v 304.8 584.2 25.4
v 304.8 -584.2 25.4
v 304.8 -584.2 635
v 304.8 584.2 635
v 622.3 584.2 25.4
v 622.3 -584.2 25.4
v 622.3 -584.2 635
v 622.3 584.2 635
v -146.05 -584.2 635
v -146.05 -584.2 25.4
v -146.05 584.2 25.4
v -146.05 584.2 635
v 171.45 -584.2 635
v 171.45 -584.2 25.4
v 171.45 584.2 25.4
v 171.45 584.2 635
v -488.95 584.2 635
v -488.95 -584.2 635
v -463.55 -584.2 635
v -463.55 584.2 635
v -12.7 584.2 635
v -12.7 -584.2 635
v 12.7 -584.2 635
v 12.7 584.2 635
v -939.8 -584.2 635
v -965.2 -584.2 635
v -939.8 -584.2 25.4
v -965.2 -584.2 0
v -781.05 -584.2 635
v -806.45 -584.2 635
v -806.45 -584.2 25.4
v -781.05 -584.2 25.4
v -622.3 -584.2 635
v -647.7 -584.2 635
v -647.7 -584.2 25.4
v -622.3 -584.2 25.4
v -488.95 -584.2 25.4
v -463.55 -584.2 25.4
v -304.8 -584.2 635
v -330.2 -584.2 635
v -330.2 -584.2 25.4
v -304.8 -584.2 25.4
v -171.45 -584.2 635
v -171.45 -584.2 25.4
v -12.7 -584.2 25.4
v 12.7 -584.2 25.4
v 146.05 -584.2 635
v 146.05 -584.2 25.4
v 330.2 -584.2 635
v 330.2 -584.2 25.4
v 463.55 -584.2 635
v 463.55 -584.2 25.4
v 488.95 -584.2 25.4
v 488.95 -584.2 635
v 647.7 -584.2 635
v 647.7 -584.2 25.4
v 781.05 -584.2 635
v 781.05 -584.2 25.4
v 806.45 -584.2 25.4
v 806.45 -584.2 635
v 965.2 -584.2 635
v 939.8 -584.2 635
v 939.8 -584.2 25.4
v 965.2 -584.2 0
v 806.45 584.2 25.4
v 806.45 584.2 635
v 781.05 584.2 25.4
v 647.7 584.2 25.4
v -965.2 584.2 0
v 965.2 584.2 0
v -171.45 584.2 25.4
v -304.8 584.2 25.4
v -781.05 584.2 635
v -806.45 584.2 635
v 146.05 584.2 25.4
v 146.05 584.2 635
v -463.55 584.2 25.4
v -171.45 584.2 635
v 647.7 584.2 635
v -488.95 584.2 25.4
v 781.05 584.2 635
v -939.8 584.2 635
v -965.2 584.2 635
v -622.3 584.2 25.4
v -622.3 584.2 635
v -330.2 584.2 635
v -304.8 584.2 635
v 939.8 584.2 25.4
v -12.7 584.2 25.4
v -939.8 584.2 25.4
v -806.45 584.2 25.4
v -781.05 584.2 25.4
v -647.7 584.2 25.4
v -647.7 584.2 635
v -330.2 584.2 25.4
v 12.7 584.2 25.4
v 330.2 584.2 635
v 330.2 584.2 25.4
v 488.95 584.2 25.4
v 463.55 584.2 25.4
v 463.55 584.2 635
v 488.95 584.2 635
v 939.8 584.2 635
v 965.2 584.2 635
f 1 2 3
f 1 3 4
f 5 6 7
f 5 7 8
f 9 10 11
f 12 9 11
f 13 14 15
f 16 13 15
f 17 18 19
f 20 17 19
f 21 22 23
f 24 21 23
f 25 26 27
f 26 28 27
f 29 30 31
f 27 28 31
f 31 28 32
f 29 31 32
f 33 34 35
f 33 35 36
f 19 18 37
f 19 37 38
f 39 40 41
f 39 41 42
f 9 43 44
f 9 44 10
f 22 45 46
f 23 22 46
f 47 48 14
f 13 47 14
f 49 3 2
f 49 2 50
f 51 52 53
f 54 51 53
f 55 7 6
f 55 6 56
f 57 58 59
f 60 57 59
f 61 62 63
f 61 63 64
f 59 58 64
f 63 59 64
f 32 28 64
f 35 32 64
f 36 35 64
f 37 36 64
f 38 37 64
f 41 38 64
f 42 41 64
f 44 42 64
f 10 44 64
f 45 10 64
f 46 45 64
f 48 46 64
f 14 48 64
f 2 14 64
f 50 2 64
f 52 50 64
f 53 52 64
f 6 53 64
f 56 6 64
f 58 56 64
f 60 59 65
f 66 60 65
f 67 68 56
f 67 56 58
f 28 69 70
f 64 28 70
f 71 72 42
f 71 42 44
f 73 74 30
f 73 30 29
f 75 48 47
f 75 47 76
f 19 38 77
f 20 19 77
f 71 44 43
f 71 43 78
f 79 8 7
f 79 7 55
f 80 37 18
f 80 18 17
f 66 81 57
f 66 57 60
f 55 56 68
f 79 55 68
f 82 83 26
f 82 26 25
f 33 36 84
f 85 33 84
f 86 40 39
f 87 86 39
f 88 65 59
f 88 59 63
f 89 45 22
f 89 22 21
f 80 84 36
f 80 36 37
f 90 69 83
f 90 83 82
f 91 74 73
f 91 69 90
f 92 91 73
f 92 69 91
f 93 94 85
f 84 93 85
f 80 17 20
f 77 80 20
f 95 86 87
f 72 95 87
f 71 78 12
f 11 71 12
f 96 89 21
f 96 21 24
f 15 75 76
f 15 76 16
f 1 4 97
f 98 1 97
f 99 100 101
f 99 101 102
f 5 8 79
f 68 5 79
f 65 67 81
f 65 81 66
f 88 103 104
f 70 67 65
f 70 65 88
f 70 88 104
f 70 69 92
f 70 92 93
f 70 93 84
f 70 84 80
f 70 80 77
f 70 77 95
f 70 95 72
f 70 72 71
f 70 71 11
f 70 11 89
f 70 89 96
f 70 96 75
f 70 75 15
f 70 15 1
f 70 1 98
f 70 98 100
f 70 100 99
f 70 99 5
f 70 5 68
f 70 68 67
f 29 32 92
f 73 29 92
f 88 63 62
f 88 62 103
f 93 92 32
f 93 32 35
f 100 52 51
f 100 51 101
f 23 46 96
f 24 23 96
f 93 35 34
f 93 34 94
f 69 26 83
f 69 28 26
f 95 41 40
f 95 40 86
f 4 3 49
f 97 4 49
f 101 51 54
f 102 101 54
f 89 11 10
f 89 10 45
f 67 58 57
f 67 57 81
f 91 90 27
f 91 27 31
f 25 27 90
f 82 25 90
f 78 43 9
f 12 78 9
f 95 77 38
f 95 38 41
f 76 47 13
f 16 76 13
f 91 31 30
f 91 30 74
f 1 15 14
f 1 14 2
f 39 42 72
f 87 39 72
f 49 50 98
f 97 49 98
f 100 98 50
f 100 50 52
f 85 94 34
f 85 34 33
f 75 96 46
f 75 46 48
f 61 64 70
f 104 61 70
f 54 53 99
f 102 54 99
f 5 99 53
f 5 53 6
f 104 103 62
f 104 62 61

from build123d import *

# Parameters (mm, degrees)
F0_W     = 1930.4
F0_H     = 1168.4
F1_DEPTH = 25.4
F2_W     = 25.4
F2_H     = 1168.4
F3_DEPTH = 609.6


with BuildPart() as f1:
    # F0 (on Top) → F1 (new body)
    with BuildSketch(Plane.XY):
        Rectangle(F0_W, F0_H)
    extrude(amount=F1_DEPTH)

    # F2 (on face) → F3 (join)
    with BuildSketch(Plane.XY.offset(25.4)):
        with Locations((-952.5, 0)):
            Rectangle(F2_W, F2_H)
        with Locations((-793.75, 0)):
            Rectangle(F2_W, F2_H)
        with Locations((-635, 0)):
            Rectangle(F2_W, F2_H)
        with Locations((-476.25, 0)):
            Rectangle(F2_W, F2_H)
        with Locations((-317.5, 0)):
            Rectangle(F2_W, F2_H)
        with Locations((-158.75, 0)):
            Rectangle(F2_W, F2_H)
        Rectangle(F2_W, F2_H)
        with Locations((158.75, 0)):
            Rectangle(F2_W, F2_H)
        with Locations((317.5, 0)):
            Rectangle(F2_W, F2_H)
        with Locations((476.25, 0)):
            Rectangle(F2_W, F2_H)
        with Locations((635, 0)):
            Rectangle(F2_W, F2_H)
        with Locations((793.75, 0)):
            Rectangle(F2_W, F2_H)
        with Locations((952.5, 0)):
            Rectangle(F2_W, F2_H)
    extrude(amount=F3_DEPTH)


solid = f1.part
